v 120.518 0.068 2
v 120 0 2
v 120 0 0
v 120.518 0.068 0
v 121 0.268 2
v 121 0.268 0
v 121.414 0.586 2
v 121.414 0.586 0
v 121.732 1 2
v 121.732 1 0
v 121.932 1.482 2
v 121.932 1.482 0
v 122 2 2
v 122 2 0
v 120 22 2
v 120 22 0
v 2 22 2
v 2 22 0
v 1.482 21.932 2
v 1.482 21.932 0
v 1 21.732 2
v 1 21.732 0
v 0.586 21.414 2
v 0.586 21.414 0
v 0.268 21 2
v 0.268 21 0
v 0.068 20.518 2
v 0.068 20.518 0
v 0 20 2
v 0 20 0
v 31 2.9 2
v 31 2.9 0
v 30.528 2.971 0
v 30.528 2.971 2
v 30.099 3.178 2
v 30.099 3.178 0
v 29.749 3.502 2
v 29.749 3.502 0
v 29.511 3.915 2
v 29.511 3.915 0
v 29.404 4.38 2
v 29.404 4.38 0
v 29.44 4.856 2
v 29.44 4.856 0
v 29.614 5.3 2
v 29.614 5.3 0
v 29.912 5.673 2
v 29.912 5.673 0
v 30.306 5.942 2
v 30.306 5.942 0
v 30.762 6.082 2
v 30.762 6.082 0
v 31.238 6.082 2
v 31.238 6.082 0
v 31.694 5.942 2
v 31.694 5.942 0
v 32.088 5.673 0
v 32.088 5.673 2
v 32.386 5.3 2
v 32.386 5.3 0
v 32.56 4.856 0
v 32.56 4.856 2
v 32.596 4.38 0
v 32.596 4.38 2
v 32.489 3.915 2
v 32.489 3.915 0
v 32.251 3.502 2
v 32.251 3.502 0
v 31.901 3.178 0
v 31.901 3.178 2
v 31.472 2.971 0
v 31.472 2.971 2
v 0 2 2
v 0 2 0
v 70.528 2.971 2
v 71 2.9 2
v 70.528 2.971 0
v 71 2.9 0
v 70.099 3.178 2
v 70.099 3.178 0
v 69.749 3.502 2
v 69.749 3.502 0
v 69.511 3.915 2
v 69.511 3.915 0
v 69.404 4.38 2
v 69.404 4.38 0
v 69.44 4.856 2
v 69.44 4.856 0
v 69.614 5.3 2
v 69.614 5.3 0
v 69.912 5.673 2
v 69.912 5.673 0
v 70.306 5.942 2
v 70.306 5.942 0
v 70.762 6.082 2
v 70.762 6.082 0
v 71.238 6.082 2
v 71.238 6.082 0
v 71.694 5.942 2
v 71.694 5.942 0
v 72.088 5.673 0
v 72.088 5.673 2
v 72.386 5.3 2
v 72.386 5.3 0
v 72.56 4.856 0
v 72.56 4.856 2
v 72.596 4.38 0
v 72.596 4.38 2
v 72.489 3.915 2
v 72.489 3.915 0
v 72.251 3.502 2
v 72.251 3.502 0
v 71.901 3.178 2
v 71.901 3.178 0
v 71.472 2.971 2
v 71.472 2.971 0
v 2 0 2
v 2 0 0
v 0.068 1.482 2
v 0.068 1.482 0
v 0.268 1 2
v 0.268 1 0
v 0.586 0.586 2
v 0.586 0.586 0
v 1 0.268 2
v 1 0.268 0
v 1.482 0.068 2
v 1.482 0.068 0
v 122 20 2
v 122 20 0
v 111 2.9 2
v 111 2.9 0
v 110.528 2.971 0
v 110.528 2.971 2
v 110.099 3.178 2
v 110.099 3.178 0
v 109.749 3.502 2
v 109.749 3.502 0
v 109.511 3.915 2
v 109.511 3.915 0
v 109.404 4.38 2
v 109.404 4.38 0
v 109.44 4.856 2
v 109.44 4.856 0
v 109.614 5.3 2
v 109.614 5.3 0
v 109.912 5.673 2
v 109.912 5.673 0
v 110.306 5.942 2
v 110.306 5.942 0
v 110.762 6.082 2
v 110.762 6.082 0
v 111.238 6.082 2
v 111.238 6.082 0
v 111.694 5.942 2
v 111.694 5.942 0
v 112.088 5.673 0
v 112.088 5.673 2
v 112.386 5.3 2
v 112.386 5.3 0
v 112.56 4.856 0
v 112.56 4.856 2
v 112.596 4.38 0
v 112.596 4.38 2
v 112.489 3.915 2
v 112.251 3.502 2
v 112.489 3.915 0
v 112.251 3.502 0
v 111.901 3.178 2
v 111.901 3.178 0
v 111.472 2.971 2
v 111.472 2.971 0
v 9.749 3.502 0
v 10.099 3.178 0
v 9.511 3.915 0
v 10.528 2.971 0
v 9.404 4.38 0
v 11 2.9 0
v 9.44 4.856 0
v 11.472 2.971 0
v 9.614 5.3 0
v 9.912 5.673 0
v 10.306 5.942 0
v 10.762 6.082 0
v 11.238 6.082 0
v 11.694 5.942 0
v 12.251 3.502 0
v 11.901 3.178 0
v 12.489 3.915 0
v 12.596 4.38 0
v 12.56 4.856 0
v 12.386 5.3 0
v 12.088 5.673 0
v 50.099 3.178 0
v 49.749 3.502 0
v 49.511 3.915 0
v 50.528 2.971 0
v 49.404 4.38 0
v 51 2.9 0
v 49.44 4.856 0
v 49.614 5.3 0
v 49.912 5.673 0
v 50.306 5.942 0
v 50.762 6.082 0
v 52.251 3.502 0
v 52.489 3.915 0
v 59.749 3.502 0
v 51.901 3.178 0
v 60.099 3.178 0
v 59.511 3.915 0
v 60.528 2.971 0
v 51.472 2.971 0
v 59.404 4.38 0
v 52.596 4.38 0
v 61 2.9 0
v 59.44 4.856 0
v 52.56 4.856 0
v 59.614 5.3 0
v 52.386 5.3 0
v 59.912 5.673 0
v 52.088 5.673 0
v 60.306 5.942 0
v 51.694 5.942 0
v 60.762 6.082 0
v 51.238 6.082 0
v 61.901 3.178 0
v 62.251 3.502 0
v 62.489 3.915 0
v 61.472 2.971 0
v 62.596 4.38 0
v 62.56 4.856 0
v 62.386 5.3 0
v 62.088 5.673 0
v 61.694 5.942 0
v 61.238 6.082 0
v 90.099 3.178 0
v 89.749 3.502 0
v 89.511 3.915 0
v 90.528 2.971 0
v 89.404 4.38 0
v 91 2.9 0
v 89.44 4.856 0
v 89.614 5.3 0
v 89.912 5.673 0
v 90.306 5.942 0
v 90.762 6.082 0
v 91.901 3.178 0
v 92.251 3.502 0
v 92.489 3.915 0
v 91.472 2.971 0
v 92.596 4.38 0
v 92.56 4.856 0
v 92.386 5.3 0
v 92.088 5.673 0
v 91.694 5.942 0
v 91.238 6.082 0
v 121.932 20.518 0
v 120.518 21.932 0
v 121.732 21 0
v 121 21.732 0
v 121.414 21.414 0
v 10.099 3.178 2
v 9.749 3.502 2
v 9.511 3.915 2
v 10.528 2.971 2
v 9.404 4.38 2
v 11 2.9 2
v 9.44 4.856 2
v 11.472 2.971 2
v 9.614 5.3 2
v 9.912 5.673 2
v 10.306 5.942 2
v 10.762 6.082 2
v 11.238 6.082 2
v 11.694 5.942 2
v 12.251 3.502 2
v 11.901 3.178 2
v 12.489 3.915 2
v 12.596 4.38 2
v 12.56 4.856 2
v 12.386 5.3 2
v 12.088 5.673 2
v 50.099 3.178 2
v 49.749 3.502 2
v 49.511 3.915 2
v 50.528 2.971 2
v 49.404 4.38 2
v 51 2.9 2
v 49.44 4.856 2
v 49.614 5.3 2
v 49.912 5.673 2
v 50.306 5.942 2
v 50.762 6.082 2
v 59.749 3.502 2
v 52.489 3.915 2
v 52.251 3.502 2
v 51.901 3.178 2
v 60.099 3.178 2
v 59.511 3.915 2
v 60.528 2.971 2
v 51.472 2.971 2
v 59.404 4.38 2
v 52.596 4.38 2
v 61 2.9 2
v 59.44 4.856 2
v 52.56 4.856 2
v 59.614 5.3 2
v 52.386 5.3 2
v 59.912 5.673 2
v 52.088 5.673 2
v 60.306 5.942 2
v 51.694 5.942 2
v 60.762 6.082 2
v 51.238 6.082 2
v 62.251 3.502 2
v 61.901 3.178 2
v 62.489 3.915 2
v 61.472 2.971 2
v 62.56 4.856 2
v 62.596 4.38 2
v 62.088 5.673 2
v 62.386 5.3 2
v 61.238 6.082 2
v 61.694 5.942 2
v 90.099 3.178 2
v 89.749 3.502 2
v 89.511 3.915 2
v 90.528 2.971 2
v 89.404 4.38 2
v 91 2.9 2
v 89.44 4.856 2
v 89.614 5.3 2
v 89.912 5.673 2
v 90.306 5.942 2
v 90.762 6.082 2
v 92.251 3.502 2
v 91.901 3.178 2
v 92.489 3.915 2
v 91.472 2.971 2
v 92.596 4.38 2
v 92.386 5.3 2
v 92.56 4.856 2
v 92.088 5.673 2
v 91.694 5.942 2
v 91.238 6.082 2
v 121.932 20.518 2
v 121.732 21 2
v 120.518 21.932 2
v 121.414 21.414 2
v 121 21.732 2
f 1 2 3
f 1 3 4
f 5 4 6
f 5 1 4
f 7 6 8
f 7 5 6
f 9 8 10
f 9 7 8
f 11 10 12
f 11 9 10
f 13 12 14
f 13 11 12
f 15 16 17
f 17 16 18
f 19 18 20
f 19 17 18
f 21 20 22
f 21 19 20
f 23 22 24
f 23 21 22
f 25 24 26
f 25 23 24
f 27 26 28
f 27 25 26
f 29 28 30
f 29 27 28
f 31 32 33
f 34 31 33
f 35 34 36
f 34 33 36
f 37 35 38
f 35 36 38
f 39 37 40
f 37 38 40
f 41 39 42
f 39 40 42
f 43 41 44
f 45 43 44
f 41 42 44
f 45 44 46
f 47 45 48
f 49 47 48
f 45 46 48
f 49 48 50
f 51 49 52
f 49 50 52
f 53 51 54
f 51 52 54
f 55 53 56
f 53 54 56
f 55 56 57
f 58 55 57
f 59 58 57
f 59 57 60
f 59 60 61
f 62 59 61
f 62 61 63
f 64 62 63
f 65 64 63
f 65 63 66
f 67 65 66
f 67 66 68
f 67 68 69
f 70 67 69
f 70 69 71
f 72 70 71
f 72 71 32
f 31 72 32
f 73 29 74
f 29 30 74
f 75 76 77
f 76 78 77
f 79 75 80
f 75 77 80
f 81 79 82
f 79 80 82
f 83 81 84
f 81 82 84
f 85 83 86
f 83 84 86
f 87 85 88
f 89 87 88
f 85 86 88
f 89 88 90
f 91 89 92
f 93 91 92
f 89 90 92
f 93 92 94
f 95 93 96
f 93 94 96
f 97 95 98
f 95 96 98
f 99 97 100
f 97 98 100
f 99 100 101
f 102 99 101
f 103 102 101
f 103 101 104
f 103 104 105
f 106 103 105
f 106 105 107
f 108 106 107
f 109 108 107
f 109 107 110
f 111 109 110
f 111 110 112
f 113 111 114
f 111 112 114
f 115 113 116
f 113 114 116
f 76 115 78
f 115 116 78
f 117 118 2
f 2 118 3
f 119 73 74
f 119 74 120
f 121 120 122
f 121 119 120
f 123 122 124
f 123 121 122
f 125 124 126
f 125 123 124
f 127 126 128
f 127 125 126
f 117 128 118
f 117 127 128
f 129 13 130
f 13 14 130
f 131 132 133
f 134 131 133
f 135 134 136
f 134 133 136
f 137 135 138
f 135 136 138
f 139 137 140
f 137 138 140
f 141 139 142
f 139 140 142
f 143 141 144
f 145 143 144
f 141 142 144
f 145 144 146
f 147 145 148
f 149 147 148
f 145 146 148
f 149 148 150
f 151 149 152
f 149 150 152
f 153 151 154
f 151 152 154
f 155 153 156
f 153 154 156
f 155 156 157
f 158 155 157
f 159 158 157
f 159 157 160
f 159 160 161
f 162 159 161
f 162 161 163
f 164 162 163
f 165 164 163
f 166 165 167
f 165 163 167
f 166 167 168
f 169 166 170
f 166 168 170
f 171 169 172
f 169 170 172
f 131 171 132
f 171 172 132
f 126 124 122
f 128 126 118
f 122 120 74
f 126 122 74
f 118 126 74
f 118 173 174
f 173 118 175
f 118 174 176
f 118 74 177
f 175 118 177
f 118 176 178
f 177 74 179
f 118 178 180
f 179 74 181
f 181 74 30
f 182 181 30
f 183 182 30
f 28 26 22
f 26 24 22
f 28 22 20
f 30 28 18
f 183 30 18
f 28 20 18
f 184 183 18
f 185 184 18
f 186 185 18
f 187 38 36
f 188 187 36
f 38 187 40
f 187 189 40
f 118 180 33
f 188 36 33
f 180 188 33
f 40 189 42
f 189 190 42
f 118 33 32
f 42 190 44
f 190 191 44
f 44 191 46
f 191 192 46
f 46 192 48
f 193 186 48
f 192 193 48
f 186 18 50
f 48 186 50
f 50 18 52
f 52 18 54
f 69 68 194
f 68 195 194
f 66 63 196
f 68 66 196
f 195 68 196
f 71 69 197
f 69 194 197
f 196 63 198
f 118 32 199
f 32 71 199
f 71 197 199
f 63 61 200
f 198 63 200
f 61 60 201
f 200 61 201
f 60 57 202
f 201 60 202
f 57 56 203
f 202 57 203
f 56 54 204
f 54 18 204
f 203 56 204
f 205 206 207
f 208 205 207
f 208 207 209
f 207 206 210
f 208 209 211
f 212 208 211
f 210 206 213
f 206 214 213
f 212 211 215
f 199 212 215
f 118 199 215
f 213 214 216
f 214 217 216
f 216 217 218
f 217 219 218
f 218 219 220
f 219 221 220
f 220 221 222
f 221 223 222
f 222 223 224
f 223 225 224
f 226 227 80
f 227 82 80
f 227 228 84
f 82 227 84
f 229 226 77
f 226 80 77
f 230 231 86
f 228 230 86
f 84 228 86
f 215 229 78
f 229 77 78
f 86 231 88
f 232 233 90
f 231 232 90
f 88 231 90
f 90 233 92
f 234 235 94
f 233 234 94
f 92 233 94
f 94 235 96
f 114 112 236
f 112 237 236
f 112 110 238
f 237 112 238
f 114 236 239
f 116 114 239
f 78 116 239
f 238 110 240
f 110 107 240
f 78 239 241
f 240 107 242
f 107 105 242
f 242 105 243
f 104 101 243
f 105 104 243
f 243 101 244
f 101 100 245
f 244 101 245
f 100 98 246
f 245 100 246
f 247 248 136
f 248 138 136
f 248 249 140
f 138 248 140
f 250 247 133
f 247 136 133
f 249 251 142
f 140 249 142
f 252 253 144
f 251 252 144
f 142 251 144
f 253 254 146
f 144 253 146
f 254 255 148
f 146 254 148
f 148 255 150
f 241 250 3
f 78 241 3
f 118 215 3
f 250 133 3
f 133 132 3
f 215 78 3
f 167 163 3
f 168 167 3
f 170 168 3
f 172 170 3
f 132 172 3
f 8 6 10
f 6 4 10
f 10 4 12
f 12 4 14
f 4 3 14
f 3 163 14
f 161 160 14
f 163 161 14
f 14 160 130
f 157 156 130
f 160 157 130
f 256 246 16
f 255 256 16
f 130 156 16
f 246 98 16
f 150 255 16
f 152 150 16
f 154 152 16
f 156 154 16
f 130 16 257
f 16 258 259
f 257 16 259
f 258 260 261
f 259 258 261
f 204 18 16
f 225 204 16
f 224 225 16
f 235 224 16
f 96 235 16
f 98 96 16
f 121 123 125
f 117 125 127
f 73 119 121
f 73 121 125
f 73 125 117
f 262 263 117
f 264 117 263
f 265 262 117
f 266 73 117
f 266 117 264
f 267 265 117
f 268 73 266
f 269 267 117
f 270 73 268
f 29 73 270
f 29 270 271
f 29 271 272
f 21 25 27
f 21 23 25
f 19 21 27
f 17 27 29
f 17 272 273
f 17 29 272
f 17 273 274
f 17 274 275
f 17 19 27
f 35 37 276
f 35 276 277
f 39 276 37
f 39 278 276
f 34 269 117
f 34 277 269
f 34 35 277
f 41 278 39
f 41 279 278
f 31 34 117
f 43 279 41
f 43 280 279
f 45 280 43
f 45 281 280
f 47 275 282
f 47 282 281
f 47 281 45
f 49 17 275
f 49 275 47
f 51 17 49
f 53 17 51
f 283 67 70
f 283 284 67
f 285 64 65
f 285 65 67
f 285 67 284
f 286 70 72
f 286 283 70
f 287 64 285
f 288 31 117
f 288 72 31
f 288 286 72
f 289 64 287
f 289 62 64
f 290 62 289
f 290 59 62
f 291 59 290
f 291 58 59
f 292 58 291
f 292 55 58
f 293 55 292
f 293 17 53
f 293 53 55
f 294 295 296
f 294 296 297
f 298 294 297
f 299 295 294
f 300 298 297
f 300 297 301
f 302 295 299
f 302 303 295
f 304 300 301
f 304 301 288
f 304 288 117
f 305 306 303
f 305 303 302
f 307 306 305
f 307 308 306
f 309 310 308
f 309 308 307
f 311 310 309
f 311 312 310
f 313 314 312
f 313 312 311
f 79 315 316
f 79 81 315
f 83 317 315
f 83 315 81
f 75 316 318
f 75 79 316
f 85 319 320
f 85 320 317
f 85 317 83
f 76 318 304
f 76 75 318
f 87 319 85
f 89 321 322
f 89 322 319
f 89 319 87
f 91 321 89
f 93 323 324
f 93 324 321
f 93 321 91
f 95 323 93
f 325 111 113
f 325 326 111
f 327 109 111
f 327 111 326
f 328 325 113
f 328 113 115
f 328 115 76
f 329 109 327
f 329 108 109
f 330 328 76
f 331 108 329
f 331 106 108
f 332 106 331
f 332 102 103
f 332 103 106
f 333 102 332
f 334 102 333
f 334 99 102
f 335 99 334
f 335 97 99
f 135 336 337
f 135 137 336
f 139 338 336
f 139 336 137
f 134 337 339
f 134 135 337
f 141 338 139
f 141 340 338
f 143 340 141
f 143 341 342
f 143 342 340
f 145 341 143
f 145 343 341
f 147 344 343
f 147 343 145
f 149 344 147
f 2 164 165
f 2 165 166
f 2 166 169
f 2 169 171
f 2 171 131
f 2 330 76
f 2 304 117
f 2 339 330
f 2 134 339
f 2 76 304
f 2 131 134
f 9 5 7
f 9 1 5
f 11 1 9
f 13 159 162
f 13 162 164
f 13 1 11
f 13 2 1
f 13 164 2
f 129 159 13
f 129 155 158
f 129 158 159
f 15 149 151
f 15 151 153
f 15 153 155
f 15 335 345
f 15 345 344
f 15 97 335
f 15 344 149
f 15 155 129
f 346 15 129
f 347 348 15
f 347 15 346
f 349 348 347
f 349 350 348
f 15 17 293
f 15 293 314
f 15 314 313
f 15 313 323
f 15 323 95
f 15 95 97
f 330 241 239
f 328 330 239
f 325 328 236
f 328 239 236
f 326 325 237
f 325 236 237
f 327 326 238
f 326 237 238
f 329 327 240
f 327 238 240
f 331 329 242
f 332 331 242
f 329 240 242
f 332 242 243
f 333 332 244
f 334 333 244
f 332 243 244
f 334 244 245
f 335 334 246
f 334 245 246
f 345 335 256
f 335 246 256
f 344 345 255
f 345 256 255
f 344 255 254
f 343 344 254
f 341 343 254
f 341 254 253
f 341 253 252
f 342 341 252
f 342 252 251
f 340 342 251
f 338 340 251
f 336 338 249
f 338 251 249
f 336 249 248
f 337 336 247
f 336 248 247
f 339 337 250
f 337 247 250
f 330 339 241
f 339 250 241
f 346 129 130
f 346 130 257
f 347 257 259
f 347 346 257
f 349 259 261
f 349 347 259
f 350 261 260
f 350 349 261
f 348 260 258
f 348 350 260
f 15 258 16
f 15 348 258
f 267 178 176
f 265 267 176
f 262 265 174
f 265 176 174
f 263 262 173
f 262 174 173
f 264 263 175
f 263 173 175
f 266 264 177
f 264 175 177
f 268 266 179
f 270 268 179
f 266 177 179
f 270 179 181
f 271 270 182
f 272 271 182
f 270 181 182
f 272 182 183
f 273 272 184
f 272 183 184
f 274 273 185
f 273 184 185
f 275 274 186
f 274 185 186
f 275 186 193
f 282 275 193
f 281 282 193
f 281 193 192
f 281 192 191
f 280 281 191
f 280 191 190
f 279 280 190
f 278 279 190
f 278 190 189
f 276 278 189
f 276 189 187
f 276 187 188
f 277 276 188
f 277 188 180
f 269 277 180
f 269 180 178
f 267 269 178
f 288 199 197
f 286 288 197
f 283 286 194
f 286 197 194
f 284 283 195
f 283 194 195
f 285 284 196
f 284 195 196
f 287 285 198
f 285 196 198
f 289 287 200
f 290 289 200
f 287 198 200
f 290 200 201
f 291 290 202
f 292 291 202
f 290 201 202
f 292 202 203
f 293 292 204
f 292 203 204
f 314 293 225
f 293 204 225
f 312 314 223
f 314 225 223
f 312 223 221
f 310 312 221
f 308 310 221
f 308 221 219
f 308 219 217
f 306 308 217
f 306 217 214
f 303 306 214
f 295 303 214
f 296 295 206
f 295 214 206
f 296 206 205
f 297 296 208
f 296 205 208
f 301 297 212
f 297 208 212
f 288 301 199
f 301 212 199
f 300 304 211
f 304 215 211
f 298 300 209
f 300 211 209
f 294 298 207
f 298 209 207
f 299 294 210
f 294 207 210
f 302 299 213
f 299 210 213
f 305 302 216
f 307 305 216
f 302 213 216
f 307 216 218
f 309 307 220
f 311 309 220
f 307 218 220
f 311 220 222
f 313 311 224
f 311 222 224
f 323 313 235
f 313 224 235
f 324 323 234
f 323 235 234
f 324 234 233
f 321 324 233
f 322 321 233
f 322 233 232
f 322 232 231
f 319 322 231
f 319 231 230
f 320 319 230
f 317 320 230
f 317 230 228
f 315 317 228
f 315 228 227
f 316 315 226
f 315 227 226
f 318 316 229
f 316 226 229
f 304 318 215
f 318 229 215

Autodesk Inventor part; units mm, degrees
ref_plane "YZ Plane" through (0, 0, 0) normal (1, 0, 0) x (0, 1, 0)
ref_plane "XZ Plane" through (0, 0, 0) normal (0, 1, 0) x (-1, 0, 0)
ref_plane "XY Plane" through (0, 0, 0) normal (0, 0, 1) x (1, 0, 0)
sketch "スケッチ1" plane through (0, 0, 0) normal (0, 0, 1) x (1, 0, 0)
  line L0 (0, 0) -> (122, 0)
  line L1 (122, 0) -> (122, 22)
  line L2 (122, 22) -> (0, 22)
  line L3 (0, 22) -> (0, 0)
  dimension "d0" = 122
  dimension "d1" = 22
extrude "押し出し1" add sketch "スケッチ1" along normal blind 2
fillet "フィレット1" radius 2 4 edges at (122, 22, 1) (122, 0, 1) (0, 22, 1) (0, 0, 1)
sketch "スケッチ2" plane through (0, 0, 2) normal (0, 0, 1) x (1, 0, 0)
  line L0 (0, 4.5) -> (122, 4.5)
  line L1 (122, 2) -> (122, 20) projected
  line L2 (2, 0) -> (120, 0) projected
  line L3 (0, 20) -> (0, 2) projected
  point P0 (0, 0)
  point P1 (11, 4.5)
  point P2 (31, 4.5)
  point P3 (51, 4.5)
  point P4 (61, 4.5)
  point P5 (71, 4.5)
  point P6 (91, 4.5)
  point P7 (111, 4.5)
  dimension "d5" = 4.5
  dimension "d6" = 11
  dimension "d7" = 11
  dimension "d8" = 20
  dimension "d9" = 20
  dimension "d10" = 10
  dimension "d11" = 10
  dimension "d12" = 20
hole "穴1" at (11, 4.5, 2) at (31, 4.5, 2) at (51, 4.5, 2) at (61, 4.5, 2) at (71, 4.5, 2) at (91, 4.5, 2) at (111, 4.5, 2) direction (0, 0, -1) diameter 3.2 end through all
properties part number "line_sensor" material "アセタール樹脂、黒"
